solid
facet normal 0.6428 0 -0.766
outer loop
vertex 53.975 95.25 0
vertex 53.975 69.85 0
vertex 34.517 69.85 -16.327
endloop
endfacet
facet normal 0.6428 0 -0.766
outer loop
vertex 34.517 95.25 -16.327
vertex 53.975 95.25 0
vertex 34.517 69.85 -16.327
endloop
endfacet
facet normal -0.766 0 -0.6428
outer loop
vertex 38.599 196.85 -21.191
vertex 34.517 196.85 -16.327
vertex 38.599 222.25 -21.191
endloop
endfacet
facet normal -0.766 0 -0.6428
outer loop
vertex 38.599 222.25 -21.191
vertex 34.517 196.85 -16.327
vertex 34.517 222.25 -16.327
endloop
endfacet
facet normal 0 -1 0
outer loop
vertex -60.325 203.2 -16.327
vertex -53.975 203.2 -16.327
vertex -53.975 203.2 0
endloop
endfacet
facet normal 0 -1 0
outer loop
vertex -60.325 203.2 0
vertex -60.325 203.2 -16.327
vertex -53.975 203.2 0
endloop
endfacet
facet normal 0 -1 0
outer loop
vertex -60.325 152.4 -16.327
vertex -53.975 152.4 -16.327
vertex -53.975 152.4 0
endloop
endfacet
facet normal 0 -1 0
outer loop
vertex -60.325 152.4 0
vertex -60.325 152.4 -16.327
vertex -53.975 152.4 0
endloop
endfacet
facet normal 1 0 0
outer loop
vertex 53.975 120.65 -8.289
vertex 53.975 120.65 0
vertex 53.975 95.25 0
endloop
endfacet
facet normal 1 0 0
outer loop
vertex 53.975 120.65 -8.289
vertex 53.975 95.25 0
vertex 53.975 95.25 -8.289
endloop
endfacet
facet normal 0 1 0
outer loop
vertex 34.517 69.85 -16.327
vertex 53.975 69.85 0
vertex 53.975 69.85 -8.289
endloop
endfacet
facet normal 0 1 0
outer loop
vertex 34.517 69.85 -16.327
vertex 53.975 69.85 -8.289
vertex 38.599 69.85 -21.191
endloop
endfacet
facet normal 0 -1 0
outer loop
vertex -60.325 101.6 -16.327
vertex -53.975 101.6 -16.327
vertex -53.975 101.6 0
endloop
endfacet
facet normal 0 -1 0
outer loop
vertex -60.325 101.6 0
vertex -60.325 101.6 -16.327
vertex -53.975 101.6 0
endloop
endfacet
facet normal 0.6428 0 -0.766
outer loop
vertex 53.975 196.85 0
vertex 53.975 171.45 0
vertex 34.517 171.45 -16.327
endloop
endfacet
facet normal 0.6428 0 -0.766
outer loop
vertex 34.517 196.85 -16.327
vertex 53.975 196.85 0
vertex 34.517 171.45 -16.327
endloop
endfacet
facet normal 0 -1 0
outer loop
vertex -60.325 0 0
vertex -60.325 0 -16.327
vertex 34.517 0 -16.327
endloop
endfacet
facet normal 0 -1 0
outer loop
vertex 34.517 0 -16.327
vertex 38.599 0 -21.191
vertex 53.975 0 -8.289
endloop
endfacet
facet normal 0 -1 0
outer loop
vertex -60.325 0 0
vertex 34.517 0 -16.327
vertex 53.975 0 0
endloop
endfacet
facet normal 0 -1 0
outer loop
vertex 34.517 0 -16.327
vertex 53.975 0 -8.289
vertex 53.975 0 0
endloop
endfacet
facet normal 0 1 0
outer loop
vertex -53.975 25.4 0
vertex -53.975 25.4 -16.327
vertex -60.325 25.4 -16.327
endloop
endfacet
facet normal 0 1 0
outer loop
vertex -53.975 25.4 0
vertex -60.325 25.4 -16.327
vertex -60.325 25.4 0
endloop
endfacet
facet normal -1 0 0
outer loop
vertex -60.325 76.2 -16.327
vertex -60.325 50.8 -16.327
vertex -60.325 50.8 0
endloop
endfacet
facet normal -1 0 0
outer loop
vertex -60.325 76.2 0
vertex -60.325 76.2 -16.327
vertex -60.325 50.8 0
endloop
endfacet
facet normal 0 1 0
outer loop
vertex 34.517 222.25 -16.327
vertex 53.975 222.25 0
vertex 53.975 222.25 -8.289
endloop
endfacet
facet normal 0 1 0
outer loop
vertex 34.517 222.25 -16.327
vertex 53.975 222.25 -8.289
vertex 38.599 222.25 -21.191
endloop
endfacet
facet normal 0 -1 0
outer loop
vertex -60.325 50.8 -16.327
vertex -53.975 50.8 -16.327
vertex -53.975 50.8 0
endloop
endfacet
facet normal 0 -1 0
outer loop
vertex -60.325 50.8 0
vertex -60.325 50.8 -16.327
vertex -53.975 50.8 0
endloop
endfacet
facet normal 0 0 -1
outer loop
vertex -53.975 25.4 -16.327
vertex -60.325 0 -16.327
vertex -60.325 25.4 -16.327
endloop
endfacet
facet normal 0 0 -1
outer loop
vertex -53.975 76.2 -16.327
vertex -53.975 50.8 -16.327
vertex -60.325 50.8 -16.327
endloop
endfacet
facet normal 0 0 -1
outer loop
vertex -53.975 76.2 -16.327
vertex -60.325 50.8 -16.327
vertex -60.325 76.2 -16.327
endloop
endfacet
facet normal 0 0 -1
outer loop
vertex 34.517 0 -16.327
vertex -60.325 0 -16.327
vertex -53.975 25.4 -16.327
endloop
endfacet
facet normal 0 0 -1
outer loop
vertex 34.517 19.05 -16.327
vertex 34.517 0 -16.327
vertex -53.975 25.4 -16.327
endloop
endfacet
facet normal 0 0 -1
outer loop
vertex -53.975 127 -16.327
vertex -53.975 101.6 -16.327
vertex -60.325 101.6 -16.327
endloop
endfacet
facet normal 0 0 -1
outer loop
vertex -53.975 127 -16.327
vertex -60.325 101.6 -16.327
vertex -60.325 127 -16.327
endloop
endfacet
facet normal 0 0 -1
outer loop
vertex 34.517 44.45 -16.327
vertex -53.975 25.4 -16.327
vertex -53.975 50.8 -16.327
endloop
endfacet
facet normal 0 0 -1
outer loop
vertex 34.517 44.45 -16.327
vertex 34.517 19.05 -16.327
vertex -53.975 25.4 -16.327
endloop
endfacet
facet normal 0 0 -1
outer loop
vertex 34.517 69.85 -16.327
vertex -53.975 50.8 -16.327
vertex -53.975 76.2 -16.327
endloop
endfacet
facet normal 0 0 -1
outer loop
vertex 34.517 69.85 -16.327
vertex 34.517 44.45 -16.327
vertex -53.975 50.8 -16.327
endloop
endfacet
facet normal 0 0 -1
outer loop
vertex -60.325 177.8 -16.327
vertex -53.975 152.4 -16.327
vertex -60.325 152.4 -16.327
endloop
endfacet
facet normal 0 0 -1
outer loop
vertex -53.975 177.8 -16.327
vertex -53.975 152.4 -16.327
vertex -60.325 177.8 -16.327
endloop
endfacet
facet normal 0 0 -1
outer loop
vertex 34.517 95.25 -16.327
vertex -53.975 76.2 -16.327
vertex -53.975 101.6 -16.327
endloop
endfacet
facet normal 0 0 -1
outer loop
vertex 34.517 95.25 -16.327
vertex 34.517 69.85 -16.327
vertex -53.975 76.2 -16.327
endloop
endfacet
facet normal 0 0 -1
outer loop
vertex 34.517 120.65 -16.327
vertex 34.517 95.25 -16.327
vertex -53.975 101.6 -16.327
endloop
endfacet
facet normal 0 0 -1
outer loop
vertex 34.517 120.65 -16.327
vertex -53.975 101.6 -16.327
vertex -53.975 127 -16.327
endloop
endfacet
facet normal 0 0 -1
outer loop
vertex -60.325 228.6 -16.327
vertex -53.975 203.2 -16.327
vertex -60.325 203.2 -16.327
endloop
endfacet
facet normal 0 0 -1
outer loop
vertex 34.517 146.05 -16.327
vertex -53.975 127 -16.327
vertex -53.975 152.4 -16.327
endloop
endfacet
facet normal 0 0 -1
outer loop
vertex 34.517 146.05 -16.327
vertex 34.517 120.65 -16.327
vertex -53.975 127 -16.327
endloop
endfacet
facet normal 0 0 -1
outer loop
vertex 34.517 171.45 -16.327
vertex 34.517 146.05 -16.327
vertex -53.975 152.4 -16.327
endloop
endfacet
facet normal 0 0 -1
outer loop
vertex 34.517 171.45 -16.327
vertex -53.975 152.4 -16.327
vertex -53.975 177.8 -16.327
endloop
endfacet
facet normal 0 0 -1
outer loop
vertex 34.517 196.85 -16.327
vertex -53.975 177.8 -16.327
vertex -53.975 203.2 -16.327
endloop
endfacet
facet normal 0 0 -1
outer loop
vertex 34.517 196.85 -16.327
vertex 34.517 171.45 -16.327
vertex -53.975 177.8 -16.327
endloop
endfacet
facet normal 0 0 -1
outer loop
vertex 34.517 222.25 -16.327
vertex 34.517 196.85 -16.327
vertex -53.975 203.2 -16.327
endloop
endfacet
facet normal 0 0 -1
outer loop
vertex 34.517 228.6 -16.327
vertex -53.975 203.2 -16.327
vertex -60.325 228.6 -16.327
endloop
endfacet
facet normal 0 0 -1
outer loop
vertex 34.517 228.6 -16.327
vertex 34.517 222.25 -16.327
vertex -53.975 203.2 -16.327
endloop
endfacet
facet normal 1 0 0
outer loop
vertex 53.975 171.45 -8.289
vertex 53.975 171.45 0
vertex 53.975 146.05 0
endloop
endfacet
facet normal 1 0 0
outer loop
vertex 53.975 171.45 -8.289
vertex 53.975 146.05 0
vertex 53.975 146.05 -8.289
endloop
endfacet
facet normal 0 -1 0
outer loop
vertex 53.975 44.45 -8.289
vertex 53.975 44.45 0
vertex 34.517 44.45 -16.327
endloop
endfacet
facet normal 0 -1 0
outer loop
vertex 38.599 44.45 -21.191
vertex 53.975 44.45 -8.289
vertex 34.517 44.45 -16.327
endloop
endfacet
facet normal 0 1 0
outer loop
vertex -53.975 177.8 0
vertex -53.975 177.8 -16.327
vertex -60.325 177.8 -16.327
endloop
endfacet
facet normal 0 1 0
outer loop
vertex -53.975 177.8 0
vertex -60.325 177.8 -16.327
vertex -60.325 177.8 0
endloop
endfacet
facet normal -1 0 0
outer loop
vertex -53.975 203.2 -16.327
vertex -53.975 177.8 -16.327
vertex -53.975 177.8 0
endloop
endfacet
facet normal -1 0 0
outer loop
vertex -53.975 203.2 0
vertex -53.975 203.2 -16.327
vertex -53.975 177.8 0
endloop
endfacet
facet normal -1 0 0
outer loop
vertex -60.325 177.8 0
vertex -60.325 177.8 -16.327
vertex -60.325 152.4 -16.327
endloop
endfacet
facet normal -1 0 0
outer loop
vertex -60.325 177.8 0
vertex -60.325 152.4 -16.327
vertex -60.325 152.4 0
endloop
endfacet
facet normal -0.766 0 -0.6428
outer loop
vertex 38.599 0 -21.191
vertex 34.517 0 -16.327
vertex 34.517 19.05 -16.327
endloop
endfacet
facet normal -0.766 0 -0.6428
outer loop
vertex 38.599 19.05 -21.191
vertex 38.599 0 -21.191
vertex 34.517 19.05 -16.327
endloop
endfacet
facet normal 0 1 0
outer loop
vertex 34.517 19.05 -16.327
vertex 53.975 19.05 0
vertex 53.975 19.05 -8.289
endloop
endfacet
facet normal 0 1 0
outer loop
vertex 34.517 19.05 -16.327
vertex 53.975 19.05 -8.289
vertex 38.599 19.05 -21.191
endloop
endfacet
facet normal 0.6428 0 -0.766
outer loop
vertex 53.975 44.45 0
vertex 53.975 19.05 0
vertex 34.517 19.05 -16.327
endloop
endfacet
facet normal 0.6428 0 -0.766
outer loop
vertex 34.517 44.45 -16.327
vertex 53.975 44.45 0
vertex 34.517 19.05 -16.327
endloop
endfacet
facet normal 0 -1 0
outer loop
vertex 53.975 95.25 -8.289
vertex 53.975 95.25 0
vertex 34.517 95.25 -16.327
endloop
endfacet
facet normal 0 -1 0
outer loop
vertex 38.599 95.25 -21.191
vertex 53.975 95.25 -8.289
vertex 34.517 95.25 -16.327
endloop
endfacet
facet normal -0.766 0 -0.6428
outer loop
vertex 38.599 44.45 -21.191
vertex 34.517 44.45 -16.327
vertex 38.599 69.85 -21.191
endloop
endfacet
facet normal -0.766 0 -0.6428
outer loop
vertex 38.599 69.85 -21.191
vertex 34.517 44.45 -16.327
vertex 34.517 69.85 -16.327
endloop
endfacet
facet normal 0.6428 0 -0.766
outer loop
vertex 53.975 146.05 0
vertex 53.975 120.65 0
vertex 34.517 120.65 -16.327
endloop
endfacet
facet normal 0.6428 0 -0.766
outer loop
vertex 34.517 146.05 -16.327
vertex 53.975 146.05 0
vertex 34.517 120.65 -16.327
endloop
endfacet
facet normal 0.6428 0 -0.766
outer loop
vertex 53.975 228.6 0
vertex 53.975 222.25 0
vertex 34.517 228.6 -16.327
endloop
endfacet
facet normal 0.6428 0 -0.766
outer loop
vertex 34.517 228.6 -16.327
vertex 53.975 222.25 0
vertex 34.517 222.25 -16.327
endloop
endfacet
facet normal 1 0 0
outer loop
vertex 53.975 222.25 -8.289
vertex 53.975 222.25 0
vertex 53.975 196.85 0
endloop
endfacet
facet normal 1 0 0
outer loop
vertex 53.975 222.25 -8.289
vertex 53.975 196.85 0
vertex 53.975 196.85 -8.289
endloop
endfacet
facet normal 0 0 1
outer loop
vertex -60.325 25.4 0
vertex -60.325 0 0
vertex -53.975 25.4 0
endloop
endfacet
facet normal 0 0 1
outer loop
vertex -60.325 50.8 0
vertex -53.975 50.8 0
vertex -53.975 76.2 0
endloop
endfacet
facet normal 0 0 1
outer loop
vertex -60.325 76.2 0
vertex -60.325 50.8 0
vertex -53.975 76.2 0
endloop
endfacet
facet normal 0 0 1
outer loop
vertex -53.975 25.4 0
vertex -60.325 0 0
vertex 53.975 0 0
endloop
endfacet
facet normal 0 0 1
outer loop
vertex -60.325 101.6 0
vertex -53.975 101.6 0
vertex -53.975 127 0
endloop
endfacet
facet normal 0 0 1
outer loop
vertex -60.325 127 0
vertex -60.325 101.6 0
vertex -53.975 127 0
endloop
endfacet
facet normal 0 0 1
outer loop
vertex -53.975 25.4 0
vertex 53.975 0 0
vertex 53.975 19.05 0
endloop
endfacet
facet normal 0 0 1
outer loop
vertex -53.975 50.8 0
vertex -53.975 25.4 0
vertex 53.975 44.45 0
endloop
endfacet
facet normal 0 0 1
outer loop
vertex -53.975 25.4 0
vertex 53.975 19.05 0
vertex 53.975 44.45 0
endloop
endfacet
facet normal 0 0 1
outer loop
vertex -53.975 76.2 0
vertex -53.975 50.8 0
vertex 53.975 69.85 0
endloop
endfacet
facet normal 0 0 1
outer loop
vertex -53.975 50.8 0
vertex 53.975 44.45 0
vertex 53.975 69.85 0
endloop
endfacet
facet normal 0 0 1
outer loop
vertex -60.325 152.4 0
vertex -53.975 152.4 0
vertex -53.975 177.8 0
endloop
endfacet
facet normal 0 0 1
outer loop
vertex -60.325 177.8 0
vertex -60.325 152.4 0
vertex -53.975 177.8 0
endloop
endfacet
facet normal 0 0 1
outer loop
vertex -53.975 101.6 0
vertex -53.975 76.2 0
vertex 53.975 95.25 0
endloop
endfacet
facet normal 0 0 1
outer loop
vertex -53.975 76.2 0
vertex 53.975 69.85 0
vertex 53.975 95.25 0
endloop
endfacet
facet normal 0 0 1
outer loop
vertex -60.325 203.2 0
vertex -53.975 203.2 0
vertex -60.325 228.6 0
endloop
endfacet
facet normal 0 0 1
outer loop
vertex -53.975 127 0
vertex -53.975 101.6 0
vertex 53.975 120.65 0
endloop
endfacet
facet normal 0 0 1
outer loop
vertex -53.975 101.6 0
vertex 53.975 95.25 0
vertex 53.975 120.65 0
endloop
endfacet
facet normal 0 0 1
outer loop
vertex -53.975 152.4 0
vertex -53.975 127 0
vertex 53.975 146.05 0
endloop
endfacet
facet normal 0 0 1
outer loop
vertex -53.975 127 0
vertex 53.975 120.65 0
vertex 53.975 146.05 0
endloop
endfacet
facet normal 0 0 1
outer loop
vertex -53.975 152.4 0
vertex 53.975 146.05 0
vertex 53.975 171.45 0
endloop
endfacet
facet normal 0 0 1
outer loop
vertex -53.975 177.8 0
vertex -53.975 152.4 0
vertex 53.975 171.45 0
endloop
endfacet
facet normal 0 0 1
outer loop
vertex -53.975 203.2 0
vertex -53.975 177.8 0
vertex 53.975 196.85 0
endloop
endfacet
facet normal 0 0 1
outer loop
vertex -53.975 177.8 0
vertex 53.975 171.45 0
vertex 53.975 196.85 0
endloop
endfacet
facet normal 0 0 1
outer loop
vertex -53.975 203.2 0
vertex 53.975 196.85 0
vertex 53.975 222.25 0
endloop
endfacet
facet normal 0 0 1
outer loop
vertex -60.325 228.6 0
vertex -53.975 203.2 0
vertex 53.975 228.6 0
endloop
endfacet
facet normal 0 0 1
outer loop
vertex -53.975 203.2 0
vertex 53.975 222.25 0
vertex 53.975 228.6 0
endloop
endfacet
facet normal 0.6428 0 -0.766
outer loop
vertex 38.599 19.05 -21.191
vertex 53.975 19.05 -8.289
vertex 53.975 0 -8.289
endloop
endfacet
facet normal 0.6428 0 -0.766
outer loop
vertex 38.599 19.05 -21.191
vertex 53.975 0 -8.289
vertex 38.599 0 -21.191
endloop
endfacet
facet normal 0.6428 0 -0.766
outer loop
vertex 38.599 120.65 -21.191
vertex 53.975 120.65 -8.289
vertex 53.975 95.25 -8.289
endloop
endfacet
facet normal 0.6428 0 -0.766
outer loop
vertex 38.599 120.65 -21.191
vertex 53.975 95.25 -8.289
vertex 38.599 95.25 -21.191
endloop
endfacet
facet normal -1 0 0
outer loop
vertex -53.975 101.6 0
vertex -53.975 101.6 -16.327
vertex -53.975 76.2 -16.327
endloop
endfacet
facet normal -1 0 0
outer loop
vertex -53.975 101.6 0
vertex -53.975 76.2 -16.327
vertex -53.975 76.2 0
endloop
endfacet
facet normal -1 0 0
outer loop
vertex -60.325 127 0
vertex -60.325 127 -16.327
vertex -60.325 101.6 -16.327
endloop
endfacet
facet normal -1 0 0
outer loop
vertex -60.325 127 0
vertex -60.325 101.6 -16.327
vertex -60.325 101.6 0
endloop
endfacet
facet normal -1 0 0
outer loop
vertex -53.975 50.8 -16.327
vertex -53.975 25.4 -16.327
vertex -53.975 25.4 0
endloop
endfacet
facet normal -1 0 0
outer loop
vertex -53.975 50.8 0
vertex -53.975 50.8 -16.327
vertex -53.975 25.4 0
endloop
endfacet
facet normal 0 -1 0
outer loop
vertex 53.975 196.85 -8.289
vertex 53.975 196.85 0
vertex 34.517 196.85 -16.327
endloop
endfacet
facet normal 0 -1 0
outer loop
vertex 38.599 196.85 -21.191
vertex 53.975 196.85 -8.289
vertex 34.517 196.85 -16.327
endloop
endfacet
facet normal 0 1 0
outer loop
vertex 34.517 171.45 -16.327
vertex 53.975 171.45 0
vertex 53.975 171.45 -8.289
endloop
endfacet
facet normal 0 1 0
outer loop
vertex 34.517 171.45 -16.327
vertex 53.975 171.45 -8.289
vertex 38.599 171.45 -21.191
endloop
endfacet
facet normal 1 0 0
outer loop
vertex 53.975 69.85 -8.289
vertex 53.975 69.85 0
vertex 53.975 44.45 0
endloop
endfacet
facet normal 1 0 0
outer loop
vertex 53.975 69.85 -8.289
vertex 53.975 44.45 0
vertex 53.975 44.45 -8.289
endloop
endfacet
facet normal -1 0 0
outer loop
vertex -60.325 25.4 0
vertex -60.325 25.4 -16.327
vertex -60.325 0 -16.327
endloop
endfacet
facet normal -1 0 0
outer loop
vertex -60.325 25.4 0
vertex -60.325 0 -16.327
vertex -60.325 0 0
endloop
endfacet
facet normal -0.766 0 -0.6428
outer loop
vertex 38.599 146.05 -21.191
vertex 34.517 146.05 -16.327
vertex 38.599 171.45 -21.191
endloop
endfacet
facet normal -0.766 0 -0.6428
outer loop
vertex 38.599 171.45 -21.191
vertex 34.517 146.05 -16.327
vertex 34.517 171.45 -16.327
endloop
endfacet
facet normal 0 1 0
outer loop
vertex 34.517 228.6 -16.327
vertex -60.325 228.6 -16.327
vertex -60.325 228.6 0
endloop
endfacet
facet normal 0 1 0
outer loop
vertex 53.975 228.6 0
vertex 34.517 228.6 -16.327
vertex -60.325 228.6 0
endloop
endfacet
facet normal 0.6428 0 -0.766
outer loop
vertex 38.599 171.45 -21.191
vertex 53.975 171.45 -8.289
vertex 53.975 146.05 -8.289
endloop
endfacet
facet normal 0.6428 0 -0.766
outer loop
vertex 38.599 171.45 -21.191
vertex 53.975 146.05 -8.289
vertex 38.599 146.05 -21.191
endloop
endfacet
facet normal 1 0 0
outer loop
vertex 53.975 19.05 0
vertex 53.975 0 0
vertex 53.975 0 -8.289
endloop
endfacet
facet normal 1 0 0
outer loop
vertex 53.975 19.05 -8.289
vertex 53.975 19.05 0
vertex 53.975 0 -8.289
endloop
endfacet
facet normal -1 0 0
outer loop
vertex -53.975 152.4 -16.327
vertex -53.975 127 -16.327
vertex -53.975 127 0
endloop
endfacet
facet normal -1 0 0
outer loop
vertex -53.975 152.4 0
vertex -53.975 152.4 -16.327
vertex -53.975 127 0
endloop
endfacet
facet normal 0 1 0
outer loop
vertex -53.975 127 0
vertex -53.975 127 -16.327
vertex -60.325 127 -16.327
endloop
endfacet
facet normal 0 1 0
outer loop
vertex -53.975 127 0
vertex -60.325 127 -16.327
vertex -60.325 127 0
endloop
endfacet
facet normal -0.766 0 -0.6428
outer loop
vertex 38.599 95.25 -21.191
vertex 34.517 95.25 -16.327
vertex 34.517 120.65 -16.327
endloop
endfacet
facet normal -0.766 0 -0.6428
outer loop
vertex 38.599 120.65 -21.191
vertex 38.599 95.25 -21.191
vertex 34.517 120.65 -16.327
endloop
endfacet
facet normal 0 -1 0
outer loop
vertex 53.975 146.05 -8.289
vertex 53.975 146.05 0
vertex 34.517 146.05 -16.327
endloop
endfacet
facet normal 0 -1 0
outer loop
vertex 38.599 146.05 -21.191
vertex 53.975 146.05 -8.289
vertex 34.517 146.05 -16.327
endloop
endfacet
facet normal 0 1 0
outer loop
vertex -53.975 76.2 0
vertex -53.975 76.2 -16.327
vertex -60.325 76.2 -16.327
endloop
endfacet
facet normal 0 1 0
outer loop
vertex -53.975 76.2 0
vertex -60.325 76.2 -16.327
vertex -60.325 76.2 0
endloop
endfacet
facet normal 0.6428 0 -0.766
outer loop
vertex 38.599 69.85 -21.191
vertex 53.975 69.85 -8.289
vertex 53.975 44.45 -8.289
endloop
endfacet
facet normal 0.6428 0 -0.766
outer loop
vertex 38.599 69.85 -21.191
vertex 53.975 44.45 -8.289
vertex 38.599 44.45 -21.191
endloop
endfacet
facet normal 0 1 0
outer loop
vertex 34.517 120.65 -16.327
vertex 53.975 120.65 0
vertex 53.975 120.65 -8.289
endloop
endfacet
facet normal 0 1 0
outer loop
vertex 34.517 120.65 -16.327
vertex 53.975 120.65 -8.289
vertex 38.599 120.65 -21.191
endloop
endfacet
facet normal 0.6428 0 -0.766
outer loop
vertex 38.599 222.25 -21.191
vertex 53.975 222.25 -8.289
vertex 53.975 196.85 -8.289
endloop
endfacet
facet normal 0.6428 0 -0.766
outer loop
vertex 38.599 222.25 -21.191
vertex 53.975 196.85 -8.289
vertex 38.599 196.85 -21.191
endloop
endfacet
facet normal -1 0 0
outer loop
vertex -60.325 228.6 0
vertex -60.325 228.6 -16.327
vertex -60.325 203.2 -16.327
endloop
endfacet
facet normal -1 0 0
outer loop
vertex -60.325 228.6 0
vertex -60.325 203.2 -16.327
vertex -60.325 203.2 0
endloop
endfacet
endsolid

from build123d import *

# Parameters (mm, degrees)
BOSS_EXTRUDE1_DEPTH = 228.6
SKETCH2_W           = 25.4
SKETCH2_H           = 25.4
SKETCH2_H_2         = 19.05
BOSS_EXTRUDE2_DEPTH = 6.35
SKETCH3_W           = 25.4
SKETCH3_H           = 25.4
CUT_EXTRUDE1_DEPTH  = 228.6
SKETCH4_W           = 16.326805286
SKETCH4_H           = 25.4
BOSS_EXTRUDE3_DEPTH = 6.35


with BuildPart() as part:
    # Sketch1 → Boss-Extrude1 (new body)
    with BuildSketch(Plane(origin=(0, 0, 0), x_dir=(1, 0, 0), z_dir=(0, 1, 0))):
        Polygon((-53.975, 0), (53.975, 0), (34.517471145, 16.326805286), (-53.975, 16.326805286), align=None)
    extrude(amount=BOSS_EXTRUDE1_DEPTH)

    # Sketch2 → Boss-Extrude2 (add)
    with BuildSketch(Plane(origin=(22.301169805, 0, -26.577499234), x_dir=(-0.7660444431189819, 0, -0.6427876096865348), z_dir=(0.6427876096865348, 0, -0.7660444431189819))):
        with Locations((-28.647248817, 209.55)):
            Rectangle(SKETCH2_W, SKETCH2_H)
        with Locations((-28.647248817, 158.75)):
            Rectangle(SKETCH2_W, SKETCH2_H)
        with Locations((-28.647248817, 107.95)):
            Rectangle(SKETCH2_W, SKETCH2_H)
        with Locations((-28.647248817, 57.15)):
            Rectangle(SKETCH2_W, SKETCH2_H)
        with Locations((-28.647248817, 9.525)):
            Rectangle(SKETCH2_W, SKETCH2_H_2)
    extrude(amount=BOSS_EXTRUDE2_DEPTH)

    # Sketch3 → Cut-Extrude1 (cut)
    with BuildSketch(Plane(origin=(0, 228.6, 0), x_dir=(1, 0, 0), z_dir=(0, 1, 0))):
        with Locations((66.675, 12.7)):
            Rectangle(SKETCH3_W, SKETCH3_H)
    extrude(amount=-CUT_EXTRUDE1_DEPTH, mode=Mode.SUBTRACT)

    # Sketch4 → Boss-Extrude3 (add)
    with BuildSketch(Plane.ZY.offset(53.975)):
        with Locations((-8.163402643, 12.7)):
            Rectangle(SKETCH4_W, SKETCH4_H)
        with Locations((-8.163402643, 63.5)):
            Rectangle(SKETCH4_W, SKETCH4_H)
        with Locations((-8.163402643, 114.3)):
            Rectangle(SKETCH4_W, SKETCH4_H)
        with Locations((-8.163402643, 165.1)):
            Rectangle(SKETCH4_W, SKETCH4_H)
        with Locations((-8.163402643, 215.9)):
            Rectangle(SKETCH4_W, SKETCH4_H)
    extrude(amount=BOSS_EXTRUDE3_DEPTH)


solid = part.part
